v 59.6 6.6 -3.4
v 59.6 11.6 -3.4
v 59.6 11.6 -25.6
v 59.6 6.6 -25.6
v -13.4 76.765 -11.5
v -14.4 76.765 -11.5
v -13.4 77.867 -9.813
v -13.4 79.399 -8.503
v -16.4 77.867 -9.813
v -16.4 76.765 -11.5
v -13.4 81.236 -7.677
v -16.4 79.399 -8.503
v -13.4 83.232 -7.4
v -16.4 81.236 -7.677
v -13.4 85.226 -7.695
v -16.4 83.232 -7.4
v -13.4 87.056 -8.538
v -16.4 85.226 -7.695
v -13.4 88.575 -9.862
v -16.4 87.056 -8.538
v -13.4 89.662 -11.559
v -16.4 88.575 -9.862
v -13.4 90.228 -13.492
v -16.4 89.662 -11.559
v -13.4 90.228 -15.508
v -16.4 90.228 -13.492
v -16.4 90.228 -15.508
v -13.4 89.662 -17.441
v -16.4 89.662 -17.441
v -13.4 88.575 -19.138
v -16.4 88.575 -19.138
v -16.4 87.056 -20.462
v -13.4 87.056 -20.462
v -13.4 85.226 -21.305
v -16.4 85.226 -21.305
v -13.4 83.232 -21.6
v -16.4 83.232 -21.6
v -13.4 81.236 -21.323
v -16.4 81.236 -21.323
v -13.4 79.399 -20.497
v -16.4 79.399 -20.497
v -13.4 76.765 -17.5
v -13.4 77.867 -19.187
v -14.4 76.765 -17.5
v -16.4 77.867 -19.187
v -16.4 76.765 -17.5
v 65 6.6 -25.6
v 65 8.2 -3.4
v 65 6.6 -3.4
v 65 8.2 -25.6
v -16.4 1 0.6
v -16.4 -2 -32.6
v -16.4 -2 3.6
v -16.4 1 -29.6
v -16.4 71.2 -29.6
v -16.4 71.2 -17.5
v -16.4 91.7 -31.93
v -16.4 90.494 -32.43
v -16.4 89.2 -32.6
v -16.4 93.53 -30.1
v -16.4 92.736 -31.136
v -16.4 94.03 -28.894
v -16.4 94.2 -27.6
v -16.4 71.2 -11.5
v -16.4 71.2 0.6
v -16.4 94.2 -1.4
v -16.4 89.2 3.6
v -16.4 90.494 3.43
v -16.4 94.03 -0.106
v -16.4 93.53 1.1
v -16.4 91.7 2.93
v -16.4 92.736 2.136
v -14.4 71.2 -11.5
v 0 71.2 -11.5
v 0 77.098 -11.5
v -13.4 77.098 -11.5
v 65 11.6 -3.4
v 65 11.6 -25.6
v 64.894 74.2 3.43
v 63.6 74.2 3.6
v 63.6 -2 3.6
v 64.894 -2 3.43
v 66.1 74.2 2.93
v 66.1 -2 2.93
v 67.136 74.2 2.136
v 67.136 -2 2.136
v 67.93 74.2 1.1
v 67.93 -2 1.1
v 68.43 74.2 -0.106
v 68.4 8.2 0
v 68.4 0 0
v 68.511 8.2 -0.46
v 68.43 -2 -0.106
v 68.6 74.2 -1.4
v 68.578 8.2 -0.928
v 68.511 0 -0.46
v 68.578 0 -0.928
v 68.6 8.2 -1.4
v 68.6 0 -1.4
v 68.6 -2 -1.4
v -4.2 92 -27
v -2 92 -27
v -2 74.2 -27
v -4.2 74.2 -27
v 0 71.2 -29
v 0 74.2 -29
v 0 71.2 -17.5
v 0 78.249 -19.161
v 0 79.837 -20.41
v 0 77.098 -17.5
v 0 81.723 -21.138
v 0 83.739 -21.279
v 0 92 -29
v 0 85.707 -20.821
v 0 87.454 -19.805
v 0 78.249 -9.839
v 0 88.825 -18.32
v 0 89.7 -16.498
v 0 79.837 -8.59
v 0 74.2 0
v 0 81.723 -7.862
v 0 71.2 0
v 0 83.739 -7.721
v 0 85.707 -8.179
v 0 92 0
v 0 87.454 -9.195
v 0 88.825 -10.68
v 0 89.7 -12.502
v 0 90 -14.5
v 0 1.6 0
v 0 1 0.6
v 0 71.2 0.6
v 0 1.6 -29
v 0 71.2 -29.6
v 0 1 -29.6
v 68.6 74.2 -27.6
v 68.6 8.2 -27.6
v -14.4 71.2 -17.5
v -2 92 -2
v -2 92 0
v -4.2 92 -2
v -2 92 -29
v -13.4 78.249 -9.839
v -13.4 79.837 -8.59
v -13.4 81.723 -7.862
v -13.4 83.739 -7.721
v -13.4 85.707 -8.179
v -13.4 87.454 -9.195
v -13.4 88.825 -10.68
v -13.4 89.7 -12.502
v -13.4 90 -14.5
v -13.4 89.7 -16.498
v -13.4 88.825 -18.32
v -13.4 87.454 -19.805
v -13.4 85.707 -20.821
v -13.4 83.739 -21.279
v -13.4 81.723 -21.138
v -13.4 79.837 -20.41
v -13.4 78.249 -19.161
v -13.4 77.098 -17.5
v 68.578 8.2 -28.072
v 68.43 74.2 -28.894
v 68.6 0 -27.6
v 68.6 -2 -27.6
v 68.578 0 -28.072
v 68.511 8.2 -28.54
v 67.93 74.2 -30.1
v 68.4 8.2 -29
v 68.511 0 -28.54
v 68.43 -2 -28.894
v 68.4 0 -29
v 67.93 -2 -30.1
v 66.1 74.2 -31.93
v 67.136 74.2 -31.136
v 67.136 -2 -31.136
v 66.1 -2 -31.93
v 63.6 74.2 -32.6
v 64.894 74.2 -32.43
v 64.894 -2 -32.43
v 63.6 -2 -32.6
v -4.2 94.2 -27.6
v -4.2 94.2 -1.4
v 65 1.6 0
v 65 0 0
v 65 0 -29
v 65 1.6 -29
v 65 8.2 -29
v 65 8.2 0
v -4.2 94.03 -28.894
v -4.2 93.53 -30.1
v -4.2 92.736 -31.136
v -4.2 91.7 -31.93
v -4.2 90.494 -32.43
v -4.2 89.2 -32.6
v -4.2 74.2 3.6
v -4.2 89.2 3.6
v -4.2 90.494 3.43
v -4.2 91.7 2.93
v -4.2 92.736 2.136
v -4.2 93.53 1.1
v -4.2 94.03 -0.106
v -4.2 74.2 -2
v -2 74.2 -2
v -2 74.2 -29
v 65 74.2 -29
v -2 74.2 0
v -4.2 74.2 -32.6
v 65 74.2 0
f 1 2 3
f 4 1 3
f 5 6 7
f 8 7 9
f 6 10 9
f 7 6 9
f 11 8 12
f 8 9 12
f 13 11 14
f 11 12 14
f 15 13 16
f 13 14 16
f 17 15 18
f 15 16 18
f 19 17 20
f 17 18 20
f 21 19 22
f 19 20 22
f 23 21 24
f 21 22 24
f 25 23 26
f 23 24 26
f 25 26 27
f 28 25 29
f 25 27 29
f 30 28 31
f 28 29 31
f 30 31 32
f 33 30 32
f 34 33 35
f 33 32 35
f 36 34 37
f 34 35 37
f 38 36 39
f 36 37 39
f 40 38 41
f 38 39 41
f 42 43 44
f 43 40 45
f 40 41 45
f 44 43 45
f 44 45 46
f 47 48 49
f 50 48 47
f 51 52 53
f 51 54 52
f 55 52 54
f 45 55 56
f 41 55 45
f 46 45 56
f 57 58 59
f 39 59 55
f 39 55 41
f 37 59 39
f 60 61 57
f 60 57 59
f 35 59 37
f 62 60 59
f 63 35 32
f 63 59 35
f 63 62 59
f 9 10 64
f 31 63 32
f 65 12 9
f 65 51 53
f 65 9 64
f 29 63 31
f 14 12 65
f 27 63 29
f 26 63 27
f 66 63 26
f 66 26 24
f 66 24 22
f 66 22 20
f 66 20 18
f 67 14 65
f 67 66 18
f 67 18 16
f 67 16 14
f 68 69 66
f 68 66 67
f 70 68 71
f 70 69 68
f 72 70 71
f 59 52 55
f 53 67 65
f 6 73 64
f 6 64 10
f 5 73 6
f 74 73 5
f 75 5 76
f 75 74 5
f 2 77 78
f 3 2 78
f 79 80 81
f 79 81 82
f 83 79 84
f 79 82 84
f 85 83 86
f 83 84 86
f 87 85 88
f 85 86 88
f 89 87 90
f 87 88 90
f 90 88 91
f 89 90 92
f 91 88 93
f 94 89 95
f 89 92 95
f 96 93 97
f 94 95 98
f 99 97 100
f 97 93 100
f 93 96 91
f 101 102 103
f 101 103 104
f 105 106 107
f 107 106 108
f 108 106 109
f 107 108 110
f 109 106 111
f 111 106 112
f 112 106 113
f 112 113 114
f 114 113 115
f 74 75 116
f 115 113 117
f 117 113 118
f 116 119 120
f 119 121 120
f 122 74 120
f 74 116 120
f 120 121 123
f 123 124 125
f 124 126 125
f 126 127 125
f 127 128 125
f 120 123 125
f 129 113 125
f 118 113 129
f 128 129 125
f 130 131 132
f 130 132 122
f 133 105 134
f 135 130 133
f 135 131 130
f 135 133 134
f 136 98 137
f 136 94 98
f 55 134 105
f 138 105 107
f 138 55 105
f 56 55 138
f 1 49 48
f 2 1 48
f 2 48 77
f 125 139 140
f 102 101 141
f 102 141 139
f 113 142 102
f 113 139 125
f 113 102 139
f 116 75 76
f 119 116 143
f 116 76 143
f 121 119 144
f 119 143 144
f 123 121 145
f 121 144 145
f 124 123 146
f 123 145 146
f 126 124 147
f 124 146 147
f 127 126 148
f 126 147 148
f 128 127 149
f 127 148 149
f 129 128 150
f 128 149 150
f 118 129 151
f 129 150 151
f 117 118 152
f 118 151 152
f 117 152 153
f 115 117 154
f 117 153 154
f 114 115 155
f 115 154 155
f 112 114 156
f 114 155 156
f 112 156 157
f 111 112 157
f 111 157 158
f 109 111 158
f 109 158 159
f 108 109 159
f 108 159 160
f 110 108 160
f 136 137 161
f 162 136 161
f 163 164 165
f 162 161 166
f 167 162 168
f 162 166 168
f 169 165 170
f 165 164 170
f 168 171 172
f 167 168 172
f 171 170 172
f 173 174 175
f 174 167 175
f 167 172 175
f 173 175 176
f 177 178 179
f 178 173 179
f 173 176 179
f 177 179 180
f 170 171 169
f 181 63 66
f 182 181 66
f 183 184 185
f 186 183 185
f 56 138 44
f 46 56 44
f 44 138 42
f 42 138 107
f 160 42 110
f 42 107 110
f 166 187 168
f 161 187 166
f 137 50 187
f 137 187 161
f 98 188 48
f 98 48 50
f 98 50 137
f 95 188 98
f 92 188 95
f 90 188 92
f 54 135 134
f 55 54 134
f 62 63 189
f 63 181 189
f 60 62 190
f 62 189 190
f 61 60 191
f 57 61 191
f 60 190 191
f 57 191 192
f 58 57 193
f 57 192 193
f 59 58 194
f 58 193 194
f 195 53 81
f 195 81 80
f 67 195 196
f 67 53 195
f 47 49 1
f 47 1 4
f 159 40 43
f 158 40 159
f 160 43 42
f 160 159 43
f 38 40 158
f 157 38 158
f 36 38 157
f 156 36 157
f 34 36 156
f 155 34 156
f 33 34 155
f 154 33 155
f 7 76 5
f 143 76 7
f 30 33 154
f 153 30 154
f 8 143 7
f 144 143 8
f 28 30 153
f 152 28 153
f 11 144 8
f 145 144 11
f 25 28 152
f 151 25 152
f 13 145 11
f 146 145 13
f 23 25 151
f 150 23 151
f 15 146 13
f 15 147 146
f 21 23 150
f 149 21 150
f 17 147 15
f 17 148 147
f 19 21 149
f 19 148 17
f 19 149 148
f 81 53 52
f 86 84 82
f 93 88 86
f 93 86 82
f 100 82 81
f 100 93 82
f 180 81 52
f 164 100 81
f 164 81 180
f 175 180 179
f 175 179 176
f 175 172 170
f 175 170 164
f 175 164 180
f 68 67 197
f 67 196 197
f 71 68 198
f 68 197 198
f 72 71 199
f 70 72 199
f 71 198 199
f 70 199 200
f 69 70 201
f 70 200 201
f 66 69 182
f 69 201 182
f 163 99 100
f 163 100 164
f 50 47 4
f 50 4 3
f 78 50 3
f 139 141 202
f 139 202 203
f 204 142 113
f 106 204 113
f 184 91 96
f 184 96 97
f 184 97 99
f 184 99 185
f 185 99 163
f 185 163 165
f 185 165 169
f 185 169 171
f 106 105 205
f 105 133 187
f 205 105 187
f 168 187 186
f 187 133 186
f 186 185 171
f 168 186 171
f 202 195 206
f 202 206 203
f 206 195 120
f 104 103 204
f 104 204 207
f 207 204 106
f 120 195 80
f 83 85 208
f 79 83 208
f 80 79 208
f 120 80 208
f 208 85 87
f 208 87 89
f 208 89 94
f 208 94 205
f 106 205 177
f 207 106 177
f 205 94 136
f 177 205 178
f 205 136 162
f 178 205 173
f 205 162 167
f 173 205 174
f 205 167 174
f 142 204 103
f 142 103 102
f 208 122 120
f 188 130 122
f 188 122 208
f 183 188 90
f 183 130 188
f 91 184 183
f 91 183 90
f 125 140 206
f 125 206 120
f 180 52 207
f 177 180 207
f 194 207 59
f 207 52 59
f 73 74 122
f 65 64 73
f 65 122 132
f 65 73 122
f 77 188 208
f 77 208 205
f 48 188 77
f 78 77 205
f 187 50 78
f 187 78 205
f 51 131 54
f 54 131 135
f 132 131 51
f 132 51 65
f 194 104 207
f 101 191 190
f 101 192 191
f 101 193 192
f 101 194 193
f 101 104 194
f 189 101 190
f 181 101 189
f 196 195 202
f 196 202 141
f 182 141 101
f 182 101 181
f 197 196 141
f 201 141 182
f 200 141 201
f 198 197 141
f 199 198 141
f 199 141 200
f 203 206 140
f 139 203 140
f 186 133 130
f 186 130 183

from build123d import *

# Parameters (mm, degrees)
SKETCH_1_W           = 72.2
SKETCH_1_H           = 36.2
SKETCH_1_W_2         = 65
SKETCH_1_H_2         = 29
EXTRUDE_1_DEPTH      = 74.2
SKETCH_2_W           = 72.2
SKETCH_2_H           = 36.2
EXTRUDE_2_DEPTH      = 2
SKETCH_3_W           = 36.2
SKETCH_3_H           = 76.2
SKETCH_3_W_2         = 30.2
SKETCH_3_H_2         = 70.2
EXTRUDE_2_2_DEPTH    = 16.4
SKETCH_4_W           = 30.2
SKETCH_4_H           = 70.2
CUT_EXTRUDE_1_DEPTH  = 16.4
SKETCH_5_W           = 29
SKETCH_5_H           = 4.8
CUT_EXTRUDE_2_DEPTH  = 5
SKETCH_8_W           = 36.2
SKETCH_8_H           = 20
EXTRUDE_3_DEPTH      = 16.4
SKETCH_7_W           = 6
SKETCH_7_H           = 17
CUT_EXTRUDE_3_DEPTH  = 17
SKETCH_9_W           = 6
SKETCH_9_H           = 17
EXTRUDE_4_DEPTH      = 2
SKETCH_10_R          = 7.1
CUT_EXTRUDE_4_DEPTH  = 3
SKETCH_11_W          = 2.2
SKETCH_11_H          = 20
CUT_EXTRUDE_5_DEPTH  = 5.6
SKETCH_12_W          = 2.2
SKETCH_12_H          = 20
CUT_EXTRUDE_6_DEPTH  = 5.6
SKETCH_13_W          = 2
SKETCH_13_H          = 3.6
CUT_EXTRUDE_7_DEPTH  = 20
FILLET_1_R           = 5
FILLET_2_R           = 5
FILLET_3_R           = 5
FILLET_4_R           = 5
SKETCH_14_W          = 4.2
SKETCH_14_H          = 29
CUT_EXTRUDE_8_DEPTH  = 2.2
SKETCH_15_R          = 6.8
CUT_EXTRUDE_9_DEPTH  = 20
SKETCH_16_W          = 6
SKETCH_16_H          = 5.564939783
CUT_EXTRUDE_10_DEPTH = 10
SKETCH_17_W          = 65
SKETCH_17_H          = 29
EXTRUDE_5_DEPTH      = 1.6
SKETCH_18_W          = 3.6
SKETCH_18_H          = 29
CUT_EXTRUDE_11_DEPTH = 3.4
SKETCH_20_W          = 22.2
SKETCH_20_H          = 5
EXTRUDE_6_DEPTH      = 5.4


with BuildPart() as part:
    # 草图1 → 拉伸-薄壁1 (new body)
    with BuildSketch(Plane(origin=(0, 0, 0), x_dir=(1, 0, 0), z_dir=(0, 1, 0))):
        with Locations((32.5, 14.5)):
            Rectangle(SKETCH_1_W, SKETCH_1_H)
        with Locations((32.5, 14.5)):
            Rectangle(SKETCH_1_W_2, SKETCH_1_H_2, mode=Mode.SUBTRACT)
    extrude(amount=EXTRUDE_1_DEPTH)

    # 草图2 → Extrude 2 (add)
    with BuildSketch(Plane(origin=(0, 0, 0), x_dir=(1, 0, 0), z_dir=(0, 1, 0))):
        with Locations((32.5, 14.5)):
            Rectangle(SKETCH_2_W, SKETCH_2_H)
    extrude(amount=-EXTRUDE_2_DEPTH)

    # 草图3 → Extrude 2 2 (add)
    with BuildSketch(Plane(origin=(0, 0, 0), x_dir=(0, 0, -1), z_dir=(1, 0, 0))):
        with Locations((14.5, 36.1)):
            Rectangle(SKETCH_3_W, SKETCH_3_H)
        with Locations((14.5, 36.1)):
            Rectangle(SKETCH_3_W_2, SKETCH_3_H_2, mode=Mode.SUBTRACT)
    extrude(amount=-EXTRUDE_2_2_DEPTH)

    # 草图4 → 切除-拉伸1 (cut)
    with BuildSketch(Plane(origin=(0, 0, 0), x_dir=(0, 0, -1), z_dir=(1, 0, 0))):
        with Locations((14.5, 36.1)):
            Rectangle(SKETCH_4_W, SKETCH_4_H)
    extrude(amount=-CUT_EXTRUDE_1_DEPTH, mode=Mode.SUBTRACT)

    # 草图5 → 切除-拉伸2 (cut)
    with BuildSketch(Plane(origin=(68.6, 0, 0), x_dir=(0, 0, -1), z_dir=(1, 0, 0))):
        with Locations((14.5, 2.4)):
            Rectangle(SKETCH_5_W, SKETCH_5_H)
    extrude(amount=-CUT_EXTRUDE_2_DEPTH, mode=Mode.SUBTRACT)

    # 草图8 → 凸台-拉伸3 (add)
    with BuildSketch(Plane.ZY.offset(16.4)):
        with Locations((-14.5, 84.2)):
            Rectangle(SKETCH_8_W, SKETCH_8_H)
    extrude(amount=-EXTRUDE_3_DEPTH)

    # 草图7 → 切除-拉伸3 (cut)
    with BuildSketch(Plane(origin=(0, 0, 0), x_dir=(0, 0, -1), z_dir=(1, 0, 0))):
        with Locations((14.5, 79.7)):
            Rectangle(SKETCH_7_W, SKETCH_7_H)
    extrude(amount=-CUT_EXTRUDE_3_DEPTH, mode=Mode.SUBTRACT)

    # 草图9 → 凸台-拉伸4 (add)
    with BuildSketch(Plane.ZY.offset(16.4)):
        with Locations((-14.5, 79.7)):
            Rectangle(SKETCH_9_W, SKETCH_9_H)
    extrude(amount=-EXTRUDE_4_DEPTH)

    # 草图10 → 切除-拉伸4 (cut)
    with BuildSketch(Plane.ZY.offset(16.4)):
        with Locations((-14.5, 83.2)):
            Circle(SKETCH_10_R)
    extrude(amount=-CUT_EXTRUDE_4_DEPTH, mode=Mode.SUBTRACT)

    # 草图11 → 切除-拉伸5 (cut)
    with BuildSketch(Plane.XY.offset(3.6)):
        with Locations((-3.1, 84.2)):
            Rectangle(SKETCH_11_W, SKETCH_11_H)
    extrude(amount=-CUT_EXTRUDE_5_DEPTH, mode=Mode.SUBTRACT)

    # 草图12 → 切除-拉伸6 (cut)
    with BuildSketch(Plane(origin=(0, 0, -32.6), x_dir=(-1, 0, 0), z_dir=(0, 0, -1))):
        with Locations((3.1, 84.2)):
            Rectangle(SKETCH_12_W, SKETCH_12_H)
    extrude(amount=-CUT_EXTRUDE_6_DEPTH, mode=Mode.SUBTRACT)

    # 草图13 → 切除-拉伸7 (cut)
    with BuildSketch(Plane(origin=(0, 94.2, 0), x_dir=(1, 0, 0), z_dir=(0, 1, 0))):
        with Locations((-1, 30.8)):
            Rectangle(SKETCH_13_W, SKETCH_13_H)
        with Locations((-1, -1.8)):
            Rectangle(SKETCH_13_W, SKETCH_13_H)
    extrude(amount=-CUT_EXTRUDE_7_DEPTH, mode=Mode.SUBTRACT)

    # 圆角1
    fillet_1_edges = [part.edges().sort_by_distance(p)[0] for p in [
        (-10.3, 94.2, 3.6),
    ]]
    fillet(fillet_1_edges, radius=FILLET_1_R)

    # 圆角2
    fillet_2_edges = [part.edges().sort_by_distance(p)[0] for p in [
        (-10.3, 94.2, -32.6),
    ]]
    fillet(fillet_2_edges, radius=FILLET_2_R)

    # 圆角3
    # the kernel refuses this fillet: 5 mm, written as the material it takes off along each edge
    with BuildSketch(Plane(origin=(68.6, -14.5, 3.6), x_dir=(-1, 0, 0), z_dir=(0, 1, 0))) as fillet_3_piece_1:
        with BuildLine():
            CenterArc((FILLET_3_R, -FILLET_3_R), FILLET_3_R, 90, 90)
            Line((0, -FILLET_3_R), (0, 0))
            Line((0, 0), (FILLET_3_R, 0))
        make_face()
    extrude(amount=101.2, mode=Mode.SUBTRACT)

    # 圆角4
    # the kernel refuses this fillet: 5 mm, written as the material it takes off along each edge
    with BuildSketch(Plane(origin=(68.6, -14.5, -32.6), x_dir=(-1, 0, 0), z_dir=(0, 1, 0))) as fillet_4_piece_1:
        with BuildLine():
            CenterArc((FILLET_4_R, FILLET_4_R), FILLET_4_R, 180, 90)
            Line((0, FILLET_4_R), (0, 0))
            Line((0, 0), (FILLET_4_R, 0))
        make_face()
    extrude(amount=101.2, mode=Mode.SUBTRACT)

    # 草图14 → 切除-拉伸8 (cut)
    with BuildSketch(Plane(origin=(0, 94.2, 0), x_dir=(1, 0, 0), z_dir=(0, 1, 0))):
        with Locations((-2.1, 14.5)):
            Rectangle(SKETCH_14_W, SKETCH_14_H)
    extrude(amount=-CUT_EXTRUDE_8_DEPTH, mode=Mode.SUBTRACT)

    # 草图15 → 切除-拉伸9 (cut)
    with BuildSketch(Plane.ZY.offset(13.4)):
        with Locations((-14.5, 83.2)):
            Circle(SKETCH_15_R)
    extrude(amount=-CUT_EXTRUDE_9_DEPTH, mode=Mode.SUBTRACT)

    # 草图16 → 切除-拉伸10 (cut)
    with BuildSketch(Plane(origin=(-14.4, 0, 0), x_dir=(0, 0, -1), z_dir=(1, 0, 0))):
        with Locations((14.5, 73.982469892)):
            Rectangle(SKETCH_16_W, SKETCH_16_H)
    extrude(amount=-CUT_EXTRUDE_10_DEPTH, mode=Mode.SUBTRACT)

    # 草图17 → 凸台-拉伸5 (add)
    with BuildSketch(Plane(origin=(0, 0, 0), x_dir=(1, 0, 0), z_dir=(0, 1, 0))):
        with Locations((32.5, 14.5)):
            Rectangle(SKETCH_17_W, SKETCH_17_H)
    extrude(amount=EXTRUDE_5_DEPTH)

    # 草图18 → 切除-拉伸11 (cut)
    with BuildSketch(Plane.XZ.offset(-4.8)):
        with Locations((66.8, -14.5)):
            Rectangle(SKETCH_18_W, SKETCH_18_H)
    extrude(amount=-CUT_EXTRUDE_11_DEPTH, mode=Mode.SUBTRACT)

    # 草图20 → 凸台-拉伸6 (add)
    with BuildSketch(Plane(origin=(65, 0, 0), x_dir=(0, 0, -1), z_dir=(1, 0, 0))):
        with Locations((14.5, 9.1)):
            Rectangle(SKETCH_20_W, SKETCH_20_H)
    extrude(amount=-EXTRUDE_6_DEPTH)


solid = part.part
